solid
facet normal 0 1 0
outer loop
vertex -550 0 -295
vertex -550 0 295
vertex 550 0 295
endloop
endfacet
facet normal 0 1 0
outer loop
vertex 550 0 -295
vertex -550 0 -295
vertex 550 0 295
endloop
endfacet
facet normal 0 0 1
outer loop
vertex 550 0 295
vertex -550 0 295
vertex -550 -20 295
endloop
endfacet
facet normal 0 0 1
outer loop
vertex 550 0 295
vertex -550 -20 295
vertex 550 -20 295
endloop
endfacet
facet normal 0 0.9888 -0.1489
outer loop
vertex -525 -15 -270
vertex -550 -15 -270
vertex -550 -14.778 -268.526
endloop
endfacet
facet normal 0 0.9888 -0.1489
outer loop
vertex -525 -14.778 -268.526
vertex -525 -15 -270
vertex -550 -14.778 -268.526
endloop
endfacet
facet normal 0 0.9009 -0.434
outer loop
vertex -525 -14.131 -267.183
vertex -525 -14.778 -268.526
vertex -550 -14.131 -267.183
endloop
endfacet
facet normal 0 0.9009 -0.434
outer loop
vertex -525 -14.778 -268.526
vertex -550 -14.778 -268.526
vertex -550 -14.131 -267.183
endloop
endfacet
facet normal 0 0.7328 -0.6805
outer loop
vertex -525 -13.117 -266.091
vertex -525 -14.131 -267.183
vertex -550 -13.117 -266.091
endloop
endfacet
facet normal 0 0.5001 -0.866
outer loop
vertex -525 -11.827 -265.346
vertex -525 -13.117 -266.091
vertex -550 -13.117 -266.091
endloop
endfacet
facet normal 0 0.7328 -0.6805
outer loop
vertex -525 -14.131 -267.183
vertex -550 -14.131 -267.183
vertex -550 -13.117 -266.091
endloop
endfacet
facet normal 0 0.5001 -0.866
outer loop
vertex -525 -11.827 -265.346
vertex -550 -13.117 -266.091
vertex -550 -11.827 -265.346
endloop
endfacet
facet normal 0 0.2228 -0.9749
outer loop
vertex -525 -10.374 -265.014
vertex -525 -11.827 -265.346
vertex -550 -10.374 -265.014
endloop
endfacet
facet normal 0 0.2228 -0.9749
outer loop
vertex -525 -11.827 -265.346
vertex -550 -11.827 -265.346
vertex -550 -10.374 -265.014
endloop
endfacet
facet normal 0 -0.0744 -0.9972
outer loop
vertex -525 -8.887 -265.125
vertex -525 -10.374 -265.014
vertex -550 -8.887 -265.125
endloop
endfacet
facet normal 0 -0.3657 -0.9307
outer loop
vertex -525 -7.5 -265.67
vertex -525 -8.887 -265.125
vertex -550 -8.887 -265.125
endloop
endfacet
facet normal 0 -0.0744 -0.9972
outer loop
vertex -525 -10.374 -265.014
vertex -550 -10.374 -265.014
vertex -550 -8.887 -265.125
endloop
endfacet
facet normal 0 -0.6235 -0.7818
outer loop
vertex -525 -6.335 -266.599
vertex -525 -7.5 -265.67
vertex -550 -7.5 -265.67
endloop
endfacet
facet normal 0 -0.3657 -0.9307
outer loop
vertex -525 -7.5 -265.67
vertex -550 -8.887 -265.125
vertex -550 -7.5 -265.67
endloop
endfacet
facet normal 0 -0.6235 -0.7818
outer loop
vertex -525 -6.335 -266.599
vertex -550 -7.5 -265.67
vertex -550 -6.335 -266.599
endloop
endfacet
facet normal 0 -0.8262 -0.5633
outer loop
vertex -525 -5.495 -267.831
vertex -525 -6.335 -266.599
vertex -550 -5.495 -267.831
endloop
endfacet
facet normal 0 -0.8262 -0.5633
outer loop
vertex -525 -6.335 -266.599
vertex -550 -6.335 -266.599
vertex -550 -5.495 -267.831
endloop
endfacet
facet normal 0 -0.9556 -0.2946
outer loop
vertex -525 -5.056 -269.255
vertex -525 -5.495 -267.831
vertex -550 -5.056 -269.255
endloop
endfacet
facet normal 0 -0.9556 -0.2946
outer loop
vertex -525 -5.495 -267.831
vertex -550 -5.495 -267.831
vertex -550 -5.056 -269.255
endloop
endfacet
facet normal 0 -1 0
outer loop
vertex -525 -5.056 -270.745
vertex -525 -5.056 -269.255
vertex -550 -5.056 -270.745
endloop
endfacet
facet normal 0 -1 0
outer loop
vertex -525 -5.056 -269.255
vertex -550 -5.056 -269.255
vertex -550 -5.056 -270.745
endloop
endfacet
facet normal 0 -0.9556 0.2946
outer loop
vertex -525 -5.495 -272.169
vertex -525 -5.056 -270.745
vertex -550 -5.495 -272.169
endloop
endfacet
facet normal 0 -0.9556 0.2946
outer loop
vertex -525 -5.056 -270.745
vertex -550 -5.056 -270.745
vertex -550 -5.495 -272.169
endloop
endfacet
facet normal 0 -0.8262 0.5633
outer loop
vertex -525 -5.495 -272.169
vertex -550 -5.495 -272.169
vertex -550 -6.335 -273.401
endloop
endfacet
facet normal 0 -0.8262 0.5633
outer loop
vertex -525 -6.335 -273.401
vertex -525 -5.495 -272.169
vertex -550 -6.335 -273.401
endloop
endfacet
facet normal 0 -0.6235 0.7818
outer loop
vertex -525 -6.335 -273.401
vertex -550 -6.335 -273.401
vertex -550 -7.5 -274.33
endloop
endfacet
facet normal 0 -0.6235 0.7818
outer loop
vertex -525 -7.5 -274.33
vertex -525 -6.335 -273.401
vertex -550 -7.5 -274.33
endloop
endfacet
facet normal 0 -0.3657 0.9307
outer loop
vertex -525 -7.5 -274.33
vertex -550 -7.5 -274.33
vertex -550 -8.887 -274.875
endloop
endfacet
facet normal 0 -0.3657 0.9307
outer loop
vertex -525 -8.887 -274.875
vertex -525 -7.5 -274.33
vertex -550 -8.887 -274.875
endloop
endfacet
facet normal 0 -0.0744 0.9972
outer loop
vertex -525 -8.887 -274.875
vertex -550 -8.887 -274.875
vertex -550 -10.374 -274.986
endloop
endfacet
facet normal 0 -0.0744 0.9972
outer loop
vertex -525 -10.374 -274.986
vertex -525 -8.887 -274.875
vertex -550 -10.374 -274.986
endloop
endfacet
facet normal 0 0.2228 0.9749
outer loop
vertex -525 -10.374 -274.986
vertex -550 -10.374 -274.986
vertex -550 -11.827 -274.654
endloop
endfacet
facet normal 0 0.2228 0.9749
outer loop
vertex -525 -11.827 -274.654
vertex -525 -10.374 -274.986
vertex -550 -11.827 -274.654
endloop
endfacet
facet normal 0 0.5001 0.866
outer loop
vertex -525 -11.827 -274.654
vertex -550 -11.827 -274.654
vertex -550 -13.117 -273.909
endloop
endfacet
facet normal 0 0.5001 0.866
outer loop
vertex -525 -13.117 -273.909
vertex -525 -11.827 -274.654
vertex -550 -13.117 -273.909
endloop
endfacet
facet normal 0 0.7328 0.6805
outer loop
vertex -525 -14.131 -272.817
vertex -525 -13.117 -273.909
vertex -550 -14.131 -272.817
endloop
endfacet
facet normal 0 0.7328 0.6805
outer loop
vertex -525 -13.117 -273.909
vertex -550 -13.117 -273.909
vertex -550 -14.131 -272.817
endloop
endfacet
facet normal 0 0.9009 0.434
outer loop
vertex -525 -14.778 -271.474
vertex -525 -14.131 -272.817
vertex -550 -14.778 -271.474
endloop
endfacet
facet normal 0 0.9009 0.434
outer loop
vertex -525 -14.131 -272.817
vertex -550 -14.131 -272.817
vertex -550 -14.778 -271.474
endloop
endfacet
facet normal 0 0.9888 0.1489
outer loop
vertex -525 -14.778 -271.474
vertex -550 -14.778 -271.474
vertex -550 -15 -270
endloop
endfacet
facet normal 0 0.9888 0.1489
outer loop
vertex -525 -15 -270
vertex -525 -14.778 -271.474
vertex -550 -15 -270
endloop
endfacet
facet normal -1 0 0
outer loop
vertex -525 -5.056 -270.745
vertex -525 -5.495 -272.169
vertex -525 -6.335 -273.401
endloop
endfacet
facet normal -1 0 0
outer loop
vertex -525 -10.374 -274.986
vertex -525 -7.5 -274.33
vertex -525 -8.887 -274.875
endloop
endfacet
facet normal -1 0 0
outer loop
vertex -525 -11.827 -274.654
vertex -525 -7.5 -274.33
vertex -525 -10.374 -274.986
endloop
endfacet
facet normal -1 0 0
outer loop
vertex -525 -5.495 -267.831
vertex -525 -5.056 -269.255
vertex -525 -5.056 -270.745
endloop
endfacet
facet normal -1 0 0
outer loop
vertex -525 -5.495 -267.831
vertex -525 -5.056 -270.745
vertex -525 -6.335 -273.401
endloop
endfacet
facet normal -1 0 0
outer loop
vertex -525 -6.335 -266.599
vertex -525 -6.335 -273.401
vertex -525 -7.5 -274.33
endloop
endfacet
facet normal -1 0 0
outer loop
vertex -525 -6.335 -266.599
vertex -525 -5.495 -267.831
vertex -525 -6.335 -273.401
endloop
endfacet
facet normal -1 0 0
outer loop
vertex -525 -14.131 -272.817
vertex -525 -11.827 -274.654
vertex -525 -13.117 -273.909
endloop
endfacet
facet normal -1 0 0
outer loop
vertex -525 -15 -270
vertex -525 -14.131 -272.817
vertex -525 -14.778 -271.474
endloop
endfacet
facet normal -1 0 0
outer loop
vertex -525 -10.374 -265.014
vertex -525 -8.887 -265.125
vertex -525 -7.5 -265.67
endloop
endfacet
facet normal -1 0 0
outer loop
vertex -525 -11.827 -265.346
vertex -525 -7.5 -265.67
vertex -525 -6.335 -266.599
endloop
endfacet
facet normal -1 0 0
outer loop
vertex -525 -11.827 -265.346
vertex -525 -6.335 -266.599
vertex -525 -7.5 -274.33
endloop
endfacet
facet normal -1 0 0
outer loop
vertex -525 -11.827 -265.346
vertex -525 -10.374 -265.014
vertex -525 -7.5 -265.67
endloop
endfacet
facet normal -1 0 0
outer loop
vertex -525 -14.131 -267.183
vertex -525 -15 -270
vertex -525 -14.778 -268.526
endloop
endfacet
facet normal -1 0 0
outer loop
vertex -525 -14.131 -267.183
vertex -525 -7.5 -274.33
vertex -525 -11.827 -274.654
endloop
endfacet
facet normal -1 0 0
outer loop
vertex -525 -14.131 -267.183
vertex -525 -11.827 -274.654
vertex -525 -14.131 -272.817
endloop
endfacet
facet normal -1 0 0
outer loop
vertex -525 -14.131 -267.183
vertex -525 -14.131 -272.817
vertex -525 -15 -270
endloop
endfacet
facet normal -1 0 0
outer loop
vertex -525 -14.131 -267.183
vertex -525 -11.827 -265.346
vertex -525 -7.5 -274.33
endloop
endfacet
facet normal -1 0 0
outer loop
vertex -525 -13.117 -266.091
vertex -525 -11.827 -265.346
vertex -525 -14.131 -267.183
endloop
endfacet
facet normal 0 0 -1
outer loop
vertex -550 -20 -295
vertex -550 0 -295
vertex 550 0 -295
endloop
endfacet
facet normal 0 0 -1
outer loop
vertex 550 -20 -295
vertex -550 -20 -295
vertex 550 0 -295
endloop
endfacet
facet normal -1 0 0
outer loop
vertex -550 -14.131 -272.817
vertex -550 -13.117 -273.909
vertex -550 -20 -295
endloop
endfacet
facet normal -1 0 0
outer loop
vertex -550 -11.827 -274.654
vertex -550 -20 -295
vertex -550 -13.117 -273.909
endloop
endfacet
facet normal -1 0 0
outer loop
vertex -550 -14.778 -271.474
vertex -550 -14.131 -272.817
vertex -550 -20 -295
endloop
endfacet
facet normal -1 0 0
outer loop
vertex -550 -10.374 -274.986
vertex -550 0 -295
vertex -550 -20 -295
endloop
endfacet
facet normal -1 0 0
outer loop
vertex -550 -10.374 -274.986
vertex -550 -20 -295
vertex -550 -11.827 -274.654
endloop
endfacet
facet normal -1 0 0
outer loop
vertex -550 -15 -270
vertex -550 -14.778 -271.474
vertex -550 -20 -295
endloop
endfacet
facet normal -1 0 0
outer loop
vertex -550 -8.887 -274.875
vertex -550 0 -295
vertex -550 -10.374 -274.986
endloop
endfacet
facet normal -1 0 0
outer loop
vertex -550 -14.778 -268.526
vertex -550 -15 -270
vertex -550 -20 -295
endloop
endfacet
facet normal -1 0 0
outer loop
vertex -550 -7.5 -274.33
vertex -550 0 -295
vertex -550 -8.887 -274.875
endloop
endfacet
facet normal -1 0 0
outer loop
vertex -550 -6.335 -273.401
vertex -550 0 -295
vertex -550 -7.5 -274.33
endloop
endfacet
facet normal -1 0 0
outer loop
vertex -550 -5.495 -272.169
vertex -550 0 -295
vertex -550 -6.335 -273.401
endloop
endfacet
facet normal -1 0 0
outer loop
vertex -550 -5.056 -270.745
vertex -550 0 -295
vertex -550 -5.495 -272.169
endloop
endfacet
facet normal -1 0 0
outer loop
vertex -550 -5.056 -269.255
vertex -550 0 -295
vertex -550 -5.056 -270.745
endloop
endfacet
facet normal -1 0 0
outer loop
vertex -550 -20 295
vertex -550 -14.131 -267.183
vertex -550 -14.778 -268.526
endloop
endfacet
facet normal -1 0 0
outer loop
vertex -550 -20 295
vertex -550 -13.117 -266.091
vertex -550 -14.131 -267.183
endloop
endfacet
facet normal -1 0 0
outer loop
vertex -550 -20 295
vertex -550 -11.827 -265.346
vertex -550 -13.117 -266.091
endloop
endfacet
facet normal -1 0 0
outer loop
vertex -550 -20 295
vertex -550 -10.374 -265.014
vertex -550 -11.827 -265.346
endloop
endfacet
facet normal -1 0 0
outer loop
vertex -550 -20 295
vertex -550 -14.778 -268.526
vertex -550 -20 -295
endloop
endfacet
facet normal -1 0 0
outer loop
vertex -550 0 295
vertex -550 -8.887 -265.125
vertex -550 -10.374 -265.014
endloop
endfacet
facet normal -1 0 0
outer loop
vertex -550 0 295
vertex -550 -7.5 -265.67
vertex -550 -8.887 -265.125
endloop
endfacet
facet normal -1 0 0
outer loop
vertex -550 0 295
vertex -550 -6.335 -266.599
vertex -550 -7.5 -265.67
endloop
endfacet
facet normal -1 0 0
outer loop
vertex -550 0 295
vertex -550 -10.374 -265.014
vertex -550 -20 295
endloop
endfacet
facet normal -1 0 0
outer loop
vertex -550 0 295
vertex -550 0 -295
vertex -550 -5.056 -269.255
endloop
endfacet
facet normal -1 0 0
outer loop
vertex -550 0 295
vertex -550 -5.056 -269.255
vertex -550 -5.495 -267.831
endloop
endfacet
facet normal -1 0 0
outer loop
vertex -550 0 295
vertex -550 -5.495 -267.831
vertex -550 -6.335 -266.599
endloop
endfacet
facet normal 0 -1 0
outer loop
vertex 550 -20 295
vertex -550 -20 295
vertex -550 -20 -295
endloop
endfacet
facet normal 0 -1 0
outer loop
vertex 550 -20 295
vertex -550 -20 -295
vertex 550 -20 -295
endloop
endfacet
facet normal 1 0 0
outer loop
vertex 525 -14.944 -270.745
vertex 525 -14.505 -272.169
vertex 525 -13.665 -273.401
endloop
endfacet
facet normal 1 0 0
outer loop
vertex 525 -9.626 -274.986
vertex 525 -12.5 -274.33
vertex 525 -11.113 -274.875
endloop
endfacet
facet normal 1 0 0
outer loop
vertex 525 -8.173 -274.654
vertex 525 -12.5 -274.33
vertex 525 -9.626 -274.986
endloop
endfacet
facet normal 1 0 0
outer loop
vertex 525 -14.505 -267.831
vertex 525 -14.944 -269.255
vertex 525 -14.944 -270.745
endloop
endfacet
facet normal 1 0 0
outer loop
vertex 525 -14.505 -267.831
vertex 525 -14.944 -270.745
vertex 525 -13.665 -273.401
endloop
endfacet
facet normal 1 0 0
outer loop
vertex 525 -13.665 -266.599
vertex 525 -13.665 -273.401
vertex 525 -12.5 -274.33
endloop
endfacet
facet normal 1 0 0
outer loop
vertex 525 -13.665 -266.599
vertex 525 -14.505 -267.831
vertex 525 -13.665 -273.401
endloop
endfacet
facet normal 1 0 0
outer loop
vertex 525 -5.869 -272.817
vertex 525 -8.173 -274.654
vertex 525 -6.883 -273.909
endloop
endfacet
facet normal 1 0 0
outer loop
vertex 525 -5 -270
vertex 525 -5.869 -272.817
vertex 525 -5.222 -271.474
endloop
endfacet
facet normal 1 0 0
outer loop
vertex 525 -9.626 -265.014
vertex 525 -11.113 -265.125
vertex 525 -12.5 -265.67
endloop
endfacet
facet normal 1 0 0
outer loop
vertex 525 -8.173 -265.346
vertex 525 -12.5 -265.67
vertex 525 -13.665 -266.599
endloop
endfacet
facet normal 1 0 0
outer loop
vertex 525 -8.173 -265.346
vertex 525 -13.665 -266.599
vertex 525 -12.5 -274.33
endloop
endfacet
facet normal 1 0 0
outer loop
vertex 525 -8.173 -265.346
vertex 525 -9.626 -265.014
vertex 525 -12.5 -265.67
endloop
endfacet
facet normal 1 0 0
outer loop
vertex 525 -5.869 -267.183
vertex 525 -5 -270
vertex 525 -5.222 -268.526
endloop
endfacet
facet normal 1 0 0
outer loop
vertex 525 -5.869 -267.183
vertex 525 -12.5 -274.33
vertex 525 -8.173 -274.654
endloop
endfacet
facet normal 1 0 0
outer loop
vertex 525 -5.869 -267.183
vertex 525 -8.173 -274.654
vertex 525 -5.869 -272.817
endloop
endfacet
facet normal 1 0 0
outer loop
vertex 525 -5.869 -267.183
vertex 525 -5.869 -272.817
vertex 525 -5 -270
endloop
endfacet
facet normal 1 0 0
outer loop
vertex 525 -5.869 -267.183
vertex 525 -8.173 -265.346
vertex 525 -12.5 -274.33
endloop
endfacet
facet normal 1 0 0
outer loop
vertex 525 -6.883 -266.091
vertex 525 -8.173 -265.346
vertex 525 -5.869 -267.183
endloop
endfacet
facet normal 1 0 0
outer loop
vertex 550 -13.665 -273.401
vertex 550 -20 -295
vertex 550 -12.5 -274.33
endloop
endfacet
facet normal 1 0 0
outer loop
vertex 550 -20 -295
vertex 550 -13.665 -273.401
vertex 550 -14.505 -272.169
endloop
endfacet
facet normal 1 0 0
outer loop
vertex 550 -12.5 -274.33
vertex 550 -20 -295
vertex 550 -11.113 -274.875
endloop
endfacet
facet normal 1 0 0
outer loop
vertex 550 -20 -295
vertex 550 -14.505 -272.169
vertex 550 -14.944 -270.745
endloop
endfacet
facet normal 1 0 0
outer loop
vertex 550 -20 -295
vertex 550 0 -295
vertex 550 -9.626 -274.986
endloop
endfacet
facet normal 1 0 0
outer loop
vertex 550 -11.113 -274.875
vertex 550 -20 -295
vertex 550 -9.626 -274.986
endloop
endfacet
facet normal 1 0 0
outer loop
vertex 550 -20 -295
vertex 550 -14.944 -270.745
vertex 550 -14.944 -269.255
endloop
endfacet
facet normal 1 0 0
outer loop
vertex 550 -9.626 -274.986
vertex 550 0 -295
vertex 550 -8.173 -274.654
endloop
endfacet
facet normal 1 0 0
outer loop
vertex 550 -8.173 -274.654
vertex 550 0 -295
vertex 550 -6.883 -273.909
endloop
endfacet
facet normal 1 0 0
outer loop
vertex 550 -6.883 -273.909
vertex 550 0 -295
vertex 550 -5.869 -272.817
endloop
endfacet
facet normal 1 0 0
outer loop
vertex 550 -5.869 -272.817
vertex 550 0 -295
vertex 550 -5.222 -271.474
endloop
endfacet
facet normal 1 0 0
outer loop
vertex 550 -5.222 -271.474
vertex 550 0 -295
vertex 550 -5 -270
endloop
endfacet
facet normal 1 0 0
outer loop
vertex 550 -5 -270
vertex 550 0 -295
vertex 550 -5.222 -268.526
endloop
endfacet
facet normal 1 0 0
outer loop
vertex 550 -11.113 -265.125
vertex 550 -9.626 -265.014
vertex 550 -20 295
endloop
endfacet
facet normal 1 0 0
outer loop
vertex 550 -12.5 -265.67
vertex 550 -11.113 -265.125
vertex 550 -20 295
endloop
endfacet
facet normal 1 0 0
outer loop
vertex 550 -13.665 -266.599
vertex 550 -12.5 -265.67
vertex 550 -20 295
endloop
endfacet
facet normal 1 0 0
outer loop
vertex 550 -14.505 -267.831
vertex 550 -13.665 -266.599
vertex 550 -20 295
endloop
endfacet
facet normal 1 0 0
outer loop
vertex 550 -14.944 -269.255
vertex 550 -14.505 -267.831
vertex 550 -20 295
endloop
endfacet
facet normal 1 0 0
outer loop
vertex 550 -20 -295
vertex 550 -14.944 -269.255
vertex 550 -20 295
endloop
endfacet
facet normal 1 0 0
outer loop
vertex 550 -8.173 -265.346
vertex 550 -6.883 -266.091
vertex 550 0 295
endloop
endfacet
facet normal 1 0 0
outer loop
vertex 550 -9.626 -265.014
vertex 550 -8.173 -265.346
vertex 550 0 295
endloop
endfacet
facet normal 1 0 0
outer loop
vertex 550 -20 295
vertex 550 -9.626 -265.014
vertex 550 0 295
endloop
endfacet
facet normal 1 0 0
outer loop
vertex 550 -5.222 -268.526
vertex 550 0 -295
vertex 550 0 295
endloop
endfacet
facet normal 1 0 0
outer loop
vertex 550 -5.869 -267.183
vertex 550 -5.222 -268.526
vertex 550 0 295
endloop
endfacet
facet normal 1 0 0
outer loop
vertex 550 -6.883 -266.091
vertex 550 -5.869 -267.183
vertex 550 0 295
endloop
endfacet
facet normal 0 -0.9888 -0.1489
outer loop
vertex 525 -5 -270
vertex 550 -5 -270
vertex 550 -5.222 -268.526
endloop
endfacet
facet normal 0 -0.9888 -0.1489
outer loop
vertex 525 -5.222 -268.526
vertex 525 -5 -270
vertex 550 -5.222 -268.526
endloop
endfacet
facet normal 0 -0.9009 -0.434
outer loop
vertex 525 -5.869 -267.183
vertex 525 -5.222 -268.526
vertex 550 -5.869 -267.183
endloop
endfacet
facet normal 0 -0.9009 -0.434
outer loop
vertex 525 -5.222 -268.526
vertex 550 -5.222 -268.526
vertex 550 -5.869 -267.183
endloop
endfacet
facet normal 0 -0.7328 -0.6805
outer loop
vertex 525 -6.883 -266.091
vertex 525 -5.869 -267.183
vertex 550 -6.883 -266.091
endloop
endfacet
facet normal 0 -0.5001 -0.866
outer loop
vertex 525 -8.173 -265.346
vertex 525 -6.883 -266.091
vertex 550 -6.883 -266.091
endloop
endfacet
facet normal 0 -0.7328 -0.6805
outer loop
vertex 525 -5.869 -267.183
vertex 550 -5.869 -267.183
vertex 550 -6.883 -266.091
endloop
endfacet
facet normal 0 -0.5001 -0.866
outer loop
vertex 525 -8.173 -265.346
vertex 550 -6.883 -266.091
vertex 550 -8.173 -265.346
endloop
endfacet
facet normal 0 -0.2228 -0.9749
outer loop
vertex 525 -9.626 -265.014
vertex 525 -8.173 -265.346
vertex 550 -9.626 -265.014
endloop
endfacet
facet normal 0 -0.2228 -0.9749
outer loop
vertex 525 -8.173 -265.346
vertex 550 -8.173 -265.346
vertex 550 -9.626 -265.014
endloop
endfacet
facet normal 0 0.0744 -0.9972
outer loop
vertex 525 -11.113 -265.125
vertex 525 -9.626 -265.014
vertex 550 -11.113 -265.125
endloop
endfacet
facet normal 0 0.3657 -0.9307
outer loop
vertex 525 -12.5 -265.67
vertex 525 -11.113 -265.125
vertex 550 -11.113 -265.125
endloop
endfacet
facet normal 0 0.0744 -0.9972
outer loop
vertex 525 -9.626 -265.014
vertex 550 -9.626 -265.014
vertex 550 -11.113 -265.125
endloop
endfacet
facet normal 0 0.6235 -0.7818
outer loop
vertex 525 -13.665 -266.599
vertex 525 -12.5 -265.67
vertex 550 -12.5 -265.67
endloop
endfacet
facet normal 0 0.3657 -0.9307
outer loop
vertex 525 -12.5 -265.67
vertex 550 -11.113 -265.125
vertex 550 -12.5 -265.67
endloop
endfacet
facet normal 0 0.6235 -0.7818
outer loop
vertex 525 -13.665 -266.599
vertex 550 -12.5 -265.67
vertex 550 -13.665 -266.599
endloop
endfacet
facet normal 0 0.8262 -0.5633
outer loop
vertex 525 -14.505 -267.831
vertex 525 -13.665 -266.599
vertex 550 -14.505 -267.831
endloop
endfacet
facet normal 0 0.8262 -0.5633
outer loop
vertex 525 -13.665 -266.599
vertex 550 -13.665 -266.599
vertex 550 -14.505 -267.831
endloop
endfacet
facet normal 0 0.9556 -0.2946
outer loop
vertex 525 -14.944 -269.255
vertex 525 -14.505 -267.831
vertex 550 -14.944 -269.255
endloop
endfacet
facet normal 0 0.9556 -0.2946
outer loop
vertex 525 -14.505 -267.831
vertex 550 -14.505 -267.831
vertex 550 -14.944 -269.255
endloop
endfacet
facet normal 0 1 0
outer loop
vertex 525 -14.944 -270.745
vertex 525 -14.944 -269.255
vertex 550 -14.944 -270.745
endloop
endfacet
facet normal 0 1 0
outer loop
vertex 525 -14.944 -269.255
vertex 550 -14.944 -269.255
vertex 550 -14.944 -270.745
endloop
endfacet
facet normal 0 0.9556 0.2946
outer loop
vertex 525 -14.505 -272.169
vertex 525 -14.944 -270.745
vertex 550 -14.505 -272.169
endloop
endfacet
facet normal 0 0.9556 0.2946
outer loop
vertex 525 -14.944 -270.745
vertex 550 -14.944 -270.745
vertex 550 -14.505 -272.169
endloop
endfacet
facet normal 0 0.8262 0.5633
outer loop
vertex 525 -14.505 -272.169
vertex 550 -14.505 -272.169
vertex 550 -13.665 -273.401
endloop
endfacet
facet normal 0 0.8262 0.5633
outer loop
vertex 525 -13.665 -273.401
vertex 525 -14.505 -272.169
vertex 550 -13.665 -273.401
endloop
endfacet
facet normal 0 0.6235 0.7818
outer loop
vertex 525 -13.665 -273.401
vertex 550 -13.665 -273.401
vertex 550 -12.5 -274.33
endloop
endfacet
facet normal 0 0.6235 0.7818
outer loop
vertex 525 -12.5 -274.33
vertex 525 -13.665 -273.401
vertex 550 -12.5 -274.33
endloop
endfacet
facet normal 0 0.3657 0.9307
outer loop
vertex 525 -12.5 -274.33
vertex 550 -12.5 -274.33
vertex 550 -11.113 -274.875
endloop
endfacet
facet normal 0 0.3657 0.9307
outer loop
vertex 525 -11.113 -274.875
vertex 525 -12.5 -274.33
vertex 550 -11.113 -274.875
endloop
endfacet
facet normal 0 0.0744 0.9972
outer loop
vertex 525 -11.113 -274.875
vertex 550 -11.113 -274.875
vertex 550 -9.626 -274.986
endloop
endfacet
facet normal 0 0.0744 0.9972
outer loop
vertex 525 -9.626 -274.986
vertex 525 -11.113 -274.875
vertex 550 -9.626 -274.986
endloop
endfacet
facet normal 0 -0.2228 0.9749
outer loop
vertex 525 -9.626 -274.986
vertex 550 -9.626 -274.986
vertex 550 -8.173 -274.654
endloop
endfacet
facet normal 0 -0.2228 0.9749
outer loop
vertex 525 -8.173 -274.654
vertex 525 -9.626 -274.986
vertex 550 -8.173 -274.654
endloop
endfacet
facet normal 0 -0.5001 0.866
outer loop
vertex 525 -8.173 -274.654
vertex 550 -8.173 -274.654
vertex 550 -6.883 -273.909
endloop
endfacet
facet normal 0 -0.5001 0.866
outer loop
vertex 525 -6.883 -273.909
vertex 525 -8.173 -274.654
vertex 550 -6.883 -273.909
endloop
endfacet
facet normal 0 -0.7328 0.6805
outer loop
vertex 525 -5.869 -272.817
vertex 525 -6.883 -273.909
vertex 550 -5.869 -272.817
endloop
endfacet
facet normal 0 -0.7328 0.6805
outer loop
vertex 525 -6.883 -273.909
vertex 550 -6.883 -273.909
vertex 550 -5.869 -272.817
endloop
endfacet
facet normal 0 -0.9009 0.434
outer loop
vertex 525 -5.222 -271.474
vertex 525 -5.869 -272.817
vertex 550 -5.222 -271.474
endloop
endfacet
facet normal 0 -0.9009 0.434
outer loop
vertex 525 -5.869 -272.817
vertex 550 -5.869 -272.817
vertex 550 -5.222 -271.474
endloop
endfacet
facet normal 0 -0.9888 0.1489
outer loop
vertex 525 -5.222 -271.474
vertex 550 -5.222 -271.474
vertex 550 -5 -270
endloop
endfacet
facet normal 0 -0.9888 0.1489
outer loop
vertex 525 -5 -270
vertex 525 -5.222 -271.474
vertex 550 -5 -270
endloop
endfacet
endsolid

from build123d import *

# Parameters (mm, degrees)
F0_W     = 1100
F0_H     = 590
F1_DEPTH = 20
F2_R     = 5
F3_DEPTH = 25
F4_R     = 5
F5_DEPTH = 25


with BuildPart() as f1:
    # F0 (on Front) → F1 (new body)
    with BuildSketch(Plane.XZ):
        Rectangle(F0_W, F0_H)
    extrude(amount=F1_DEPTH)

    # F2 (on face) → F3 (cut)
    with BuildSketch(Plane.YZ.offset(550)):
        with Locations((-10, -270)):
            Circle(F2_R)
    extrude(amount=-F3_DEPTH, mode=Mode.SUBTRACT)

    # F4 (on face) → F5 (cut)
    with BuildSketch(Plane(origin=(-550, 0, 0), x_dir=(0, -1, 0), z_dir=(-1, 0, 0))):
        with Locations((10, -270)):
            Circle(F4_R)
    extrude(amount=-F5_DEPTH, mode=Mode.SUBTRACT)


solid = f1.part
